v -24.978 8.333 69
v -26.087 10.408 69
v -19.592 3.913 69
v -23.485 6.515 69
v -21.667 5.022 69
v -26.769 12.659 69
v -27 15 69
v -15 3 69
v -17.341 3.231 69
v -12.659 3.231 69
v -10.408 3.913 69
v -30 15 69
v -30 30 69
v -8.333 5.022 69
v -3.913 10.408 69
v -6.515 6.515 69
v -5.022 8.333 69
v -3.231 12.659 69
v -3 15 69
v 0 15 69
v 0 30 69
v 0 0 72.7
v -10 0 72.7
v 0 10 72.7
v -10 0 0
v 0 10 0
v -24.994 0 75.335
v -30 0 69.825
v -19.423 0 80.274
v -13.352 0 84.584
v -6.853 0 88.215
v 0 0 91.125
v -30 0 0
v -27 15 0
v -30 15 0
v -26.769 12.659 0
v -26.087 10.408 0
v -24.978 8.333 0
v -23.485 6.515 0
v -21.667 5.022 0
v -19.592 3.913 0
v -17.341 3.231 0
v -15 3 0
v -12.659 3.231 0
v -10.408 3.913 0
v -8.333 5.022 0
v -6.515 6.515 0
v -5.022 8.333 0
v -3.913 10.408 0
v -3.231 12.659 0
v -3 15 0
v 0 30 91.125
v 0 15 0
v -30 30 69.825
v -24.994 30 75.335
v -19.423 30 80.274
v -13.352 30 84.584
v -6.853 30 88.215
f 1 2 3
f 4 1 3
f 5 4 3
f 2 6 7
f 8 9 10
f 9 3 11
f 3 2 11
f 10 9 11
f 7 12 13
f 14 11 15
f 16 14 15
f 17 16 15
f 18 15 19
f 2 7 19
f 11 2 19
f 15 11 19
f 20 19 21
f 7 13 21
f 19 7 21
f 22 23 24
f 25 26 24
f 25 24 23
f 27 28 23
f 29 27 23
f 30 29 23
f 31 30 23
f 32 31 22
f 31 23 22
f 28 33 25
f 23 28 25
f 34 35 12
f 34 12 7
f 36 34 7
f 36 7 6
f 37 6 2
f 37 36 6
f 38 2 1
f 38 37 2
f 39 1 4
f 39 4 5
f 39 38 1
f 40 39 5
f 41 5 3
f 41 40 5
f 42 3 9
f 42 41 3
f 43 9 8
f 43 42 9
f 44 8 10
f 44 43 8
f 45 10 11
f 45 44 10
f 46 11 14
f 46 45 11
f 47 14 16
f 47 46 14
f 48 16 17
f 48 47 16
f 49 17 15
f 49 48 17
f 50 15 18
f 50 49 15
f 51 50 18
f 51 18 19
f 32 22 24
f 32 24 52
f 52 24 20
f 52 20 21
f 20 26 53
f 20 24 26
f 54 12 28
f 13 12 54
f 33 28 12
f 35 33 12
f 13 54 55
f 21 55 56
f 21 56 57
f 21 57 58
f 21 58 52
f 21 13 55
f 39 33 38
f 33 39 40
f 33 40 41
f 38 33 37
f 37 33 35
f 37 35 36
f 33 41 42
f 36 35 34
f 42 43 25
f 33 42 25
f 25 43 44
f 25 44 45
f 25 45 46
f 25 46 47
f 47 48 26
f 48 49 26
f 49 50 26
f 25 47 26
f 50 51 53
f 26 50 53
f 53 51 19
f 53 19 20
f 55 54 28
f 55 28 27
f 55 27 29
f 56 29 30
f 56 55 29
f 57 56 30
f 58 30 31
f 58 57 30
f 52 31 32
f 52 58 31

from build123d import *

# Parameters (mm, degrees)
SKETCH2_W           = 30
SKETCH2_H           = 30
BOSS_EXTRUDE1_DEPTH = 100
CUT_EXTRUDE1_START  = -30
CUT_EXTRUDE1_DEPTH  = 30
CUT_EXTRUDE2_DEPTH  = 69
CUT_EXTRUDE3_DEPTH  = 72.7


# Read off the part's stored shape, not the designer's step: Cut-Extrude1
with BuildPart() as part:
    # Sketch2 → Boss-Extrude1 (new body)
    with BuildSketch(Plane.XY):
        with Locations((-15, 15)):
            Rectangle(SKETCH2_W, SKETCH2_H)
    extrude(amount=BOSS_EXTRUDE1_DEPTH)

    # Cut-Extrude1 outline → Cut-Extrude1 (cut)
    with BuildSketch(Plane.XZ.offset(CUT_EXTRUDE1_START)):
        with BuildLine():
            ThreePointArc((-30, 69.824648593), (-16.445900415, 82.511221459), (0, 91.124879576))
            Line((0, 91.124879576), (0, 100))
            Line((0, 100), (-30, 100))
            Line((-30, 100), (-30, 69.824648593))
        make_face()
    extrude(amount=CUT_EXTRUDE1_DEPTH, mode=Mode.SUBTRACT)

    # Sketch4 → Cut-Extrude2 (cut)
    with BuildSketch(Plane(origin=(0, 0, 0), x_dir=(-1, 0, 0), z_dir=(0, 0, -1))):
        with BuildLine():
            Line((3, 15), (0, 15))
            Line((0, 15), (0, 30))
            Line((0, 30), (30, 30))
            Line((30, 30), (30, 15))
            Line((30, 15), (27, 15))
            ThreePointArc((27, 15), (15, 3), (3, 15))
        make_face()
    extrude(amount=-CUT_EXTRUDE2_DEPTH, mode=Mode.SUBTRACT)

    # Sketch5 → Cut-Extrude3 (cut)
    with BuildSketch(Plane(origin=(0, 0, 0), x_dir=(-1, 0, 0), z_dir=(0, 0, -1))):
        Polygon((0, 0), (0, 10), (10, 0), align=None)
    extrude(amount=-CUT_EXTRUDE3_DEPTH, mode=Mode.SUBTRACT)


solid = part.part
